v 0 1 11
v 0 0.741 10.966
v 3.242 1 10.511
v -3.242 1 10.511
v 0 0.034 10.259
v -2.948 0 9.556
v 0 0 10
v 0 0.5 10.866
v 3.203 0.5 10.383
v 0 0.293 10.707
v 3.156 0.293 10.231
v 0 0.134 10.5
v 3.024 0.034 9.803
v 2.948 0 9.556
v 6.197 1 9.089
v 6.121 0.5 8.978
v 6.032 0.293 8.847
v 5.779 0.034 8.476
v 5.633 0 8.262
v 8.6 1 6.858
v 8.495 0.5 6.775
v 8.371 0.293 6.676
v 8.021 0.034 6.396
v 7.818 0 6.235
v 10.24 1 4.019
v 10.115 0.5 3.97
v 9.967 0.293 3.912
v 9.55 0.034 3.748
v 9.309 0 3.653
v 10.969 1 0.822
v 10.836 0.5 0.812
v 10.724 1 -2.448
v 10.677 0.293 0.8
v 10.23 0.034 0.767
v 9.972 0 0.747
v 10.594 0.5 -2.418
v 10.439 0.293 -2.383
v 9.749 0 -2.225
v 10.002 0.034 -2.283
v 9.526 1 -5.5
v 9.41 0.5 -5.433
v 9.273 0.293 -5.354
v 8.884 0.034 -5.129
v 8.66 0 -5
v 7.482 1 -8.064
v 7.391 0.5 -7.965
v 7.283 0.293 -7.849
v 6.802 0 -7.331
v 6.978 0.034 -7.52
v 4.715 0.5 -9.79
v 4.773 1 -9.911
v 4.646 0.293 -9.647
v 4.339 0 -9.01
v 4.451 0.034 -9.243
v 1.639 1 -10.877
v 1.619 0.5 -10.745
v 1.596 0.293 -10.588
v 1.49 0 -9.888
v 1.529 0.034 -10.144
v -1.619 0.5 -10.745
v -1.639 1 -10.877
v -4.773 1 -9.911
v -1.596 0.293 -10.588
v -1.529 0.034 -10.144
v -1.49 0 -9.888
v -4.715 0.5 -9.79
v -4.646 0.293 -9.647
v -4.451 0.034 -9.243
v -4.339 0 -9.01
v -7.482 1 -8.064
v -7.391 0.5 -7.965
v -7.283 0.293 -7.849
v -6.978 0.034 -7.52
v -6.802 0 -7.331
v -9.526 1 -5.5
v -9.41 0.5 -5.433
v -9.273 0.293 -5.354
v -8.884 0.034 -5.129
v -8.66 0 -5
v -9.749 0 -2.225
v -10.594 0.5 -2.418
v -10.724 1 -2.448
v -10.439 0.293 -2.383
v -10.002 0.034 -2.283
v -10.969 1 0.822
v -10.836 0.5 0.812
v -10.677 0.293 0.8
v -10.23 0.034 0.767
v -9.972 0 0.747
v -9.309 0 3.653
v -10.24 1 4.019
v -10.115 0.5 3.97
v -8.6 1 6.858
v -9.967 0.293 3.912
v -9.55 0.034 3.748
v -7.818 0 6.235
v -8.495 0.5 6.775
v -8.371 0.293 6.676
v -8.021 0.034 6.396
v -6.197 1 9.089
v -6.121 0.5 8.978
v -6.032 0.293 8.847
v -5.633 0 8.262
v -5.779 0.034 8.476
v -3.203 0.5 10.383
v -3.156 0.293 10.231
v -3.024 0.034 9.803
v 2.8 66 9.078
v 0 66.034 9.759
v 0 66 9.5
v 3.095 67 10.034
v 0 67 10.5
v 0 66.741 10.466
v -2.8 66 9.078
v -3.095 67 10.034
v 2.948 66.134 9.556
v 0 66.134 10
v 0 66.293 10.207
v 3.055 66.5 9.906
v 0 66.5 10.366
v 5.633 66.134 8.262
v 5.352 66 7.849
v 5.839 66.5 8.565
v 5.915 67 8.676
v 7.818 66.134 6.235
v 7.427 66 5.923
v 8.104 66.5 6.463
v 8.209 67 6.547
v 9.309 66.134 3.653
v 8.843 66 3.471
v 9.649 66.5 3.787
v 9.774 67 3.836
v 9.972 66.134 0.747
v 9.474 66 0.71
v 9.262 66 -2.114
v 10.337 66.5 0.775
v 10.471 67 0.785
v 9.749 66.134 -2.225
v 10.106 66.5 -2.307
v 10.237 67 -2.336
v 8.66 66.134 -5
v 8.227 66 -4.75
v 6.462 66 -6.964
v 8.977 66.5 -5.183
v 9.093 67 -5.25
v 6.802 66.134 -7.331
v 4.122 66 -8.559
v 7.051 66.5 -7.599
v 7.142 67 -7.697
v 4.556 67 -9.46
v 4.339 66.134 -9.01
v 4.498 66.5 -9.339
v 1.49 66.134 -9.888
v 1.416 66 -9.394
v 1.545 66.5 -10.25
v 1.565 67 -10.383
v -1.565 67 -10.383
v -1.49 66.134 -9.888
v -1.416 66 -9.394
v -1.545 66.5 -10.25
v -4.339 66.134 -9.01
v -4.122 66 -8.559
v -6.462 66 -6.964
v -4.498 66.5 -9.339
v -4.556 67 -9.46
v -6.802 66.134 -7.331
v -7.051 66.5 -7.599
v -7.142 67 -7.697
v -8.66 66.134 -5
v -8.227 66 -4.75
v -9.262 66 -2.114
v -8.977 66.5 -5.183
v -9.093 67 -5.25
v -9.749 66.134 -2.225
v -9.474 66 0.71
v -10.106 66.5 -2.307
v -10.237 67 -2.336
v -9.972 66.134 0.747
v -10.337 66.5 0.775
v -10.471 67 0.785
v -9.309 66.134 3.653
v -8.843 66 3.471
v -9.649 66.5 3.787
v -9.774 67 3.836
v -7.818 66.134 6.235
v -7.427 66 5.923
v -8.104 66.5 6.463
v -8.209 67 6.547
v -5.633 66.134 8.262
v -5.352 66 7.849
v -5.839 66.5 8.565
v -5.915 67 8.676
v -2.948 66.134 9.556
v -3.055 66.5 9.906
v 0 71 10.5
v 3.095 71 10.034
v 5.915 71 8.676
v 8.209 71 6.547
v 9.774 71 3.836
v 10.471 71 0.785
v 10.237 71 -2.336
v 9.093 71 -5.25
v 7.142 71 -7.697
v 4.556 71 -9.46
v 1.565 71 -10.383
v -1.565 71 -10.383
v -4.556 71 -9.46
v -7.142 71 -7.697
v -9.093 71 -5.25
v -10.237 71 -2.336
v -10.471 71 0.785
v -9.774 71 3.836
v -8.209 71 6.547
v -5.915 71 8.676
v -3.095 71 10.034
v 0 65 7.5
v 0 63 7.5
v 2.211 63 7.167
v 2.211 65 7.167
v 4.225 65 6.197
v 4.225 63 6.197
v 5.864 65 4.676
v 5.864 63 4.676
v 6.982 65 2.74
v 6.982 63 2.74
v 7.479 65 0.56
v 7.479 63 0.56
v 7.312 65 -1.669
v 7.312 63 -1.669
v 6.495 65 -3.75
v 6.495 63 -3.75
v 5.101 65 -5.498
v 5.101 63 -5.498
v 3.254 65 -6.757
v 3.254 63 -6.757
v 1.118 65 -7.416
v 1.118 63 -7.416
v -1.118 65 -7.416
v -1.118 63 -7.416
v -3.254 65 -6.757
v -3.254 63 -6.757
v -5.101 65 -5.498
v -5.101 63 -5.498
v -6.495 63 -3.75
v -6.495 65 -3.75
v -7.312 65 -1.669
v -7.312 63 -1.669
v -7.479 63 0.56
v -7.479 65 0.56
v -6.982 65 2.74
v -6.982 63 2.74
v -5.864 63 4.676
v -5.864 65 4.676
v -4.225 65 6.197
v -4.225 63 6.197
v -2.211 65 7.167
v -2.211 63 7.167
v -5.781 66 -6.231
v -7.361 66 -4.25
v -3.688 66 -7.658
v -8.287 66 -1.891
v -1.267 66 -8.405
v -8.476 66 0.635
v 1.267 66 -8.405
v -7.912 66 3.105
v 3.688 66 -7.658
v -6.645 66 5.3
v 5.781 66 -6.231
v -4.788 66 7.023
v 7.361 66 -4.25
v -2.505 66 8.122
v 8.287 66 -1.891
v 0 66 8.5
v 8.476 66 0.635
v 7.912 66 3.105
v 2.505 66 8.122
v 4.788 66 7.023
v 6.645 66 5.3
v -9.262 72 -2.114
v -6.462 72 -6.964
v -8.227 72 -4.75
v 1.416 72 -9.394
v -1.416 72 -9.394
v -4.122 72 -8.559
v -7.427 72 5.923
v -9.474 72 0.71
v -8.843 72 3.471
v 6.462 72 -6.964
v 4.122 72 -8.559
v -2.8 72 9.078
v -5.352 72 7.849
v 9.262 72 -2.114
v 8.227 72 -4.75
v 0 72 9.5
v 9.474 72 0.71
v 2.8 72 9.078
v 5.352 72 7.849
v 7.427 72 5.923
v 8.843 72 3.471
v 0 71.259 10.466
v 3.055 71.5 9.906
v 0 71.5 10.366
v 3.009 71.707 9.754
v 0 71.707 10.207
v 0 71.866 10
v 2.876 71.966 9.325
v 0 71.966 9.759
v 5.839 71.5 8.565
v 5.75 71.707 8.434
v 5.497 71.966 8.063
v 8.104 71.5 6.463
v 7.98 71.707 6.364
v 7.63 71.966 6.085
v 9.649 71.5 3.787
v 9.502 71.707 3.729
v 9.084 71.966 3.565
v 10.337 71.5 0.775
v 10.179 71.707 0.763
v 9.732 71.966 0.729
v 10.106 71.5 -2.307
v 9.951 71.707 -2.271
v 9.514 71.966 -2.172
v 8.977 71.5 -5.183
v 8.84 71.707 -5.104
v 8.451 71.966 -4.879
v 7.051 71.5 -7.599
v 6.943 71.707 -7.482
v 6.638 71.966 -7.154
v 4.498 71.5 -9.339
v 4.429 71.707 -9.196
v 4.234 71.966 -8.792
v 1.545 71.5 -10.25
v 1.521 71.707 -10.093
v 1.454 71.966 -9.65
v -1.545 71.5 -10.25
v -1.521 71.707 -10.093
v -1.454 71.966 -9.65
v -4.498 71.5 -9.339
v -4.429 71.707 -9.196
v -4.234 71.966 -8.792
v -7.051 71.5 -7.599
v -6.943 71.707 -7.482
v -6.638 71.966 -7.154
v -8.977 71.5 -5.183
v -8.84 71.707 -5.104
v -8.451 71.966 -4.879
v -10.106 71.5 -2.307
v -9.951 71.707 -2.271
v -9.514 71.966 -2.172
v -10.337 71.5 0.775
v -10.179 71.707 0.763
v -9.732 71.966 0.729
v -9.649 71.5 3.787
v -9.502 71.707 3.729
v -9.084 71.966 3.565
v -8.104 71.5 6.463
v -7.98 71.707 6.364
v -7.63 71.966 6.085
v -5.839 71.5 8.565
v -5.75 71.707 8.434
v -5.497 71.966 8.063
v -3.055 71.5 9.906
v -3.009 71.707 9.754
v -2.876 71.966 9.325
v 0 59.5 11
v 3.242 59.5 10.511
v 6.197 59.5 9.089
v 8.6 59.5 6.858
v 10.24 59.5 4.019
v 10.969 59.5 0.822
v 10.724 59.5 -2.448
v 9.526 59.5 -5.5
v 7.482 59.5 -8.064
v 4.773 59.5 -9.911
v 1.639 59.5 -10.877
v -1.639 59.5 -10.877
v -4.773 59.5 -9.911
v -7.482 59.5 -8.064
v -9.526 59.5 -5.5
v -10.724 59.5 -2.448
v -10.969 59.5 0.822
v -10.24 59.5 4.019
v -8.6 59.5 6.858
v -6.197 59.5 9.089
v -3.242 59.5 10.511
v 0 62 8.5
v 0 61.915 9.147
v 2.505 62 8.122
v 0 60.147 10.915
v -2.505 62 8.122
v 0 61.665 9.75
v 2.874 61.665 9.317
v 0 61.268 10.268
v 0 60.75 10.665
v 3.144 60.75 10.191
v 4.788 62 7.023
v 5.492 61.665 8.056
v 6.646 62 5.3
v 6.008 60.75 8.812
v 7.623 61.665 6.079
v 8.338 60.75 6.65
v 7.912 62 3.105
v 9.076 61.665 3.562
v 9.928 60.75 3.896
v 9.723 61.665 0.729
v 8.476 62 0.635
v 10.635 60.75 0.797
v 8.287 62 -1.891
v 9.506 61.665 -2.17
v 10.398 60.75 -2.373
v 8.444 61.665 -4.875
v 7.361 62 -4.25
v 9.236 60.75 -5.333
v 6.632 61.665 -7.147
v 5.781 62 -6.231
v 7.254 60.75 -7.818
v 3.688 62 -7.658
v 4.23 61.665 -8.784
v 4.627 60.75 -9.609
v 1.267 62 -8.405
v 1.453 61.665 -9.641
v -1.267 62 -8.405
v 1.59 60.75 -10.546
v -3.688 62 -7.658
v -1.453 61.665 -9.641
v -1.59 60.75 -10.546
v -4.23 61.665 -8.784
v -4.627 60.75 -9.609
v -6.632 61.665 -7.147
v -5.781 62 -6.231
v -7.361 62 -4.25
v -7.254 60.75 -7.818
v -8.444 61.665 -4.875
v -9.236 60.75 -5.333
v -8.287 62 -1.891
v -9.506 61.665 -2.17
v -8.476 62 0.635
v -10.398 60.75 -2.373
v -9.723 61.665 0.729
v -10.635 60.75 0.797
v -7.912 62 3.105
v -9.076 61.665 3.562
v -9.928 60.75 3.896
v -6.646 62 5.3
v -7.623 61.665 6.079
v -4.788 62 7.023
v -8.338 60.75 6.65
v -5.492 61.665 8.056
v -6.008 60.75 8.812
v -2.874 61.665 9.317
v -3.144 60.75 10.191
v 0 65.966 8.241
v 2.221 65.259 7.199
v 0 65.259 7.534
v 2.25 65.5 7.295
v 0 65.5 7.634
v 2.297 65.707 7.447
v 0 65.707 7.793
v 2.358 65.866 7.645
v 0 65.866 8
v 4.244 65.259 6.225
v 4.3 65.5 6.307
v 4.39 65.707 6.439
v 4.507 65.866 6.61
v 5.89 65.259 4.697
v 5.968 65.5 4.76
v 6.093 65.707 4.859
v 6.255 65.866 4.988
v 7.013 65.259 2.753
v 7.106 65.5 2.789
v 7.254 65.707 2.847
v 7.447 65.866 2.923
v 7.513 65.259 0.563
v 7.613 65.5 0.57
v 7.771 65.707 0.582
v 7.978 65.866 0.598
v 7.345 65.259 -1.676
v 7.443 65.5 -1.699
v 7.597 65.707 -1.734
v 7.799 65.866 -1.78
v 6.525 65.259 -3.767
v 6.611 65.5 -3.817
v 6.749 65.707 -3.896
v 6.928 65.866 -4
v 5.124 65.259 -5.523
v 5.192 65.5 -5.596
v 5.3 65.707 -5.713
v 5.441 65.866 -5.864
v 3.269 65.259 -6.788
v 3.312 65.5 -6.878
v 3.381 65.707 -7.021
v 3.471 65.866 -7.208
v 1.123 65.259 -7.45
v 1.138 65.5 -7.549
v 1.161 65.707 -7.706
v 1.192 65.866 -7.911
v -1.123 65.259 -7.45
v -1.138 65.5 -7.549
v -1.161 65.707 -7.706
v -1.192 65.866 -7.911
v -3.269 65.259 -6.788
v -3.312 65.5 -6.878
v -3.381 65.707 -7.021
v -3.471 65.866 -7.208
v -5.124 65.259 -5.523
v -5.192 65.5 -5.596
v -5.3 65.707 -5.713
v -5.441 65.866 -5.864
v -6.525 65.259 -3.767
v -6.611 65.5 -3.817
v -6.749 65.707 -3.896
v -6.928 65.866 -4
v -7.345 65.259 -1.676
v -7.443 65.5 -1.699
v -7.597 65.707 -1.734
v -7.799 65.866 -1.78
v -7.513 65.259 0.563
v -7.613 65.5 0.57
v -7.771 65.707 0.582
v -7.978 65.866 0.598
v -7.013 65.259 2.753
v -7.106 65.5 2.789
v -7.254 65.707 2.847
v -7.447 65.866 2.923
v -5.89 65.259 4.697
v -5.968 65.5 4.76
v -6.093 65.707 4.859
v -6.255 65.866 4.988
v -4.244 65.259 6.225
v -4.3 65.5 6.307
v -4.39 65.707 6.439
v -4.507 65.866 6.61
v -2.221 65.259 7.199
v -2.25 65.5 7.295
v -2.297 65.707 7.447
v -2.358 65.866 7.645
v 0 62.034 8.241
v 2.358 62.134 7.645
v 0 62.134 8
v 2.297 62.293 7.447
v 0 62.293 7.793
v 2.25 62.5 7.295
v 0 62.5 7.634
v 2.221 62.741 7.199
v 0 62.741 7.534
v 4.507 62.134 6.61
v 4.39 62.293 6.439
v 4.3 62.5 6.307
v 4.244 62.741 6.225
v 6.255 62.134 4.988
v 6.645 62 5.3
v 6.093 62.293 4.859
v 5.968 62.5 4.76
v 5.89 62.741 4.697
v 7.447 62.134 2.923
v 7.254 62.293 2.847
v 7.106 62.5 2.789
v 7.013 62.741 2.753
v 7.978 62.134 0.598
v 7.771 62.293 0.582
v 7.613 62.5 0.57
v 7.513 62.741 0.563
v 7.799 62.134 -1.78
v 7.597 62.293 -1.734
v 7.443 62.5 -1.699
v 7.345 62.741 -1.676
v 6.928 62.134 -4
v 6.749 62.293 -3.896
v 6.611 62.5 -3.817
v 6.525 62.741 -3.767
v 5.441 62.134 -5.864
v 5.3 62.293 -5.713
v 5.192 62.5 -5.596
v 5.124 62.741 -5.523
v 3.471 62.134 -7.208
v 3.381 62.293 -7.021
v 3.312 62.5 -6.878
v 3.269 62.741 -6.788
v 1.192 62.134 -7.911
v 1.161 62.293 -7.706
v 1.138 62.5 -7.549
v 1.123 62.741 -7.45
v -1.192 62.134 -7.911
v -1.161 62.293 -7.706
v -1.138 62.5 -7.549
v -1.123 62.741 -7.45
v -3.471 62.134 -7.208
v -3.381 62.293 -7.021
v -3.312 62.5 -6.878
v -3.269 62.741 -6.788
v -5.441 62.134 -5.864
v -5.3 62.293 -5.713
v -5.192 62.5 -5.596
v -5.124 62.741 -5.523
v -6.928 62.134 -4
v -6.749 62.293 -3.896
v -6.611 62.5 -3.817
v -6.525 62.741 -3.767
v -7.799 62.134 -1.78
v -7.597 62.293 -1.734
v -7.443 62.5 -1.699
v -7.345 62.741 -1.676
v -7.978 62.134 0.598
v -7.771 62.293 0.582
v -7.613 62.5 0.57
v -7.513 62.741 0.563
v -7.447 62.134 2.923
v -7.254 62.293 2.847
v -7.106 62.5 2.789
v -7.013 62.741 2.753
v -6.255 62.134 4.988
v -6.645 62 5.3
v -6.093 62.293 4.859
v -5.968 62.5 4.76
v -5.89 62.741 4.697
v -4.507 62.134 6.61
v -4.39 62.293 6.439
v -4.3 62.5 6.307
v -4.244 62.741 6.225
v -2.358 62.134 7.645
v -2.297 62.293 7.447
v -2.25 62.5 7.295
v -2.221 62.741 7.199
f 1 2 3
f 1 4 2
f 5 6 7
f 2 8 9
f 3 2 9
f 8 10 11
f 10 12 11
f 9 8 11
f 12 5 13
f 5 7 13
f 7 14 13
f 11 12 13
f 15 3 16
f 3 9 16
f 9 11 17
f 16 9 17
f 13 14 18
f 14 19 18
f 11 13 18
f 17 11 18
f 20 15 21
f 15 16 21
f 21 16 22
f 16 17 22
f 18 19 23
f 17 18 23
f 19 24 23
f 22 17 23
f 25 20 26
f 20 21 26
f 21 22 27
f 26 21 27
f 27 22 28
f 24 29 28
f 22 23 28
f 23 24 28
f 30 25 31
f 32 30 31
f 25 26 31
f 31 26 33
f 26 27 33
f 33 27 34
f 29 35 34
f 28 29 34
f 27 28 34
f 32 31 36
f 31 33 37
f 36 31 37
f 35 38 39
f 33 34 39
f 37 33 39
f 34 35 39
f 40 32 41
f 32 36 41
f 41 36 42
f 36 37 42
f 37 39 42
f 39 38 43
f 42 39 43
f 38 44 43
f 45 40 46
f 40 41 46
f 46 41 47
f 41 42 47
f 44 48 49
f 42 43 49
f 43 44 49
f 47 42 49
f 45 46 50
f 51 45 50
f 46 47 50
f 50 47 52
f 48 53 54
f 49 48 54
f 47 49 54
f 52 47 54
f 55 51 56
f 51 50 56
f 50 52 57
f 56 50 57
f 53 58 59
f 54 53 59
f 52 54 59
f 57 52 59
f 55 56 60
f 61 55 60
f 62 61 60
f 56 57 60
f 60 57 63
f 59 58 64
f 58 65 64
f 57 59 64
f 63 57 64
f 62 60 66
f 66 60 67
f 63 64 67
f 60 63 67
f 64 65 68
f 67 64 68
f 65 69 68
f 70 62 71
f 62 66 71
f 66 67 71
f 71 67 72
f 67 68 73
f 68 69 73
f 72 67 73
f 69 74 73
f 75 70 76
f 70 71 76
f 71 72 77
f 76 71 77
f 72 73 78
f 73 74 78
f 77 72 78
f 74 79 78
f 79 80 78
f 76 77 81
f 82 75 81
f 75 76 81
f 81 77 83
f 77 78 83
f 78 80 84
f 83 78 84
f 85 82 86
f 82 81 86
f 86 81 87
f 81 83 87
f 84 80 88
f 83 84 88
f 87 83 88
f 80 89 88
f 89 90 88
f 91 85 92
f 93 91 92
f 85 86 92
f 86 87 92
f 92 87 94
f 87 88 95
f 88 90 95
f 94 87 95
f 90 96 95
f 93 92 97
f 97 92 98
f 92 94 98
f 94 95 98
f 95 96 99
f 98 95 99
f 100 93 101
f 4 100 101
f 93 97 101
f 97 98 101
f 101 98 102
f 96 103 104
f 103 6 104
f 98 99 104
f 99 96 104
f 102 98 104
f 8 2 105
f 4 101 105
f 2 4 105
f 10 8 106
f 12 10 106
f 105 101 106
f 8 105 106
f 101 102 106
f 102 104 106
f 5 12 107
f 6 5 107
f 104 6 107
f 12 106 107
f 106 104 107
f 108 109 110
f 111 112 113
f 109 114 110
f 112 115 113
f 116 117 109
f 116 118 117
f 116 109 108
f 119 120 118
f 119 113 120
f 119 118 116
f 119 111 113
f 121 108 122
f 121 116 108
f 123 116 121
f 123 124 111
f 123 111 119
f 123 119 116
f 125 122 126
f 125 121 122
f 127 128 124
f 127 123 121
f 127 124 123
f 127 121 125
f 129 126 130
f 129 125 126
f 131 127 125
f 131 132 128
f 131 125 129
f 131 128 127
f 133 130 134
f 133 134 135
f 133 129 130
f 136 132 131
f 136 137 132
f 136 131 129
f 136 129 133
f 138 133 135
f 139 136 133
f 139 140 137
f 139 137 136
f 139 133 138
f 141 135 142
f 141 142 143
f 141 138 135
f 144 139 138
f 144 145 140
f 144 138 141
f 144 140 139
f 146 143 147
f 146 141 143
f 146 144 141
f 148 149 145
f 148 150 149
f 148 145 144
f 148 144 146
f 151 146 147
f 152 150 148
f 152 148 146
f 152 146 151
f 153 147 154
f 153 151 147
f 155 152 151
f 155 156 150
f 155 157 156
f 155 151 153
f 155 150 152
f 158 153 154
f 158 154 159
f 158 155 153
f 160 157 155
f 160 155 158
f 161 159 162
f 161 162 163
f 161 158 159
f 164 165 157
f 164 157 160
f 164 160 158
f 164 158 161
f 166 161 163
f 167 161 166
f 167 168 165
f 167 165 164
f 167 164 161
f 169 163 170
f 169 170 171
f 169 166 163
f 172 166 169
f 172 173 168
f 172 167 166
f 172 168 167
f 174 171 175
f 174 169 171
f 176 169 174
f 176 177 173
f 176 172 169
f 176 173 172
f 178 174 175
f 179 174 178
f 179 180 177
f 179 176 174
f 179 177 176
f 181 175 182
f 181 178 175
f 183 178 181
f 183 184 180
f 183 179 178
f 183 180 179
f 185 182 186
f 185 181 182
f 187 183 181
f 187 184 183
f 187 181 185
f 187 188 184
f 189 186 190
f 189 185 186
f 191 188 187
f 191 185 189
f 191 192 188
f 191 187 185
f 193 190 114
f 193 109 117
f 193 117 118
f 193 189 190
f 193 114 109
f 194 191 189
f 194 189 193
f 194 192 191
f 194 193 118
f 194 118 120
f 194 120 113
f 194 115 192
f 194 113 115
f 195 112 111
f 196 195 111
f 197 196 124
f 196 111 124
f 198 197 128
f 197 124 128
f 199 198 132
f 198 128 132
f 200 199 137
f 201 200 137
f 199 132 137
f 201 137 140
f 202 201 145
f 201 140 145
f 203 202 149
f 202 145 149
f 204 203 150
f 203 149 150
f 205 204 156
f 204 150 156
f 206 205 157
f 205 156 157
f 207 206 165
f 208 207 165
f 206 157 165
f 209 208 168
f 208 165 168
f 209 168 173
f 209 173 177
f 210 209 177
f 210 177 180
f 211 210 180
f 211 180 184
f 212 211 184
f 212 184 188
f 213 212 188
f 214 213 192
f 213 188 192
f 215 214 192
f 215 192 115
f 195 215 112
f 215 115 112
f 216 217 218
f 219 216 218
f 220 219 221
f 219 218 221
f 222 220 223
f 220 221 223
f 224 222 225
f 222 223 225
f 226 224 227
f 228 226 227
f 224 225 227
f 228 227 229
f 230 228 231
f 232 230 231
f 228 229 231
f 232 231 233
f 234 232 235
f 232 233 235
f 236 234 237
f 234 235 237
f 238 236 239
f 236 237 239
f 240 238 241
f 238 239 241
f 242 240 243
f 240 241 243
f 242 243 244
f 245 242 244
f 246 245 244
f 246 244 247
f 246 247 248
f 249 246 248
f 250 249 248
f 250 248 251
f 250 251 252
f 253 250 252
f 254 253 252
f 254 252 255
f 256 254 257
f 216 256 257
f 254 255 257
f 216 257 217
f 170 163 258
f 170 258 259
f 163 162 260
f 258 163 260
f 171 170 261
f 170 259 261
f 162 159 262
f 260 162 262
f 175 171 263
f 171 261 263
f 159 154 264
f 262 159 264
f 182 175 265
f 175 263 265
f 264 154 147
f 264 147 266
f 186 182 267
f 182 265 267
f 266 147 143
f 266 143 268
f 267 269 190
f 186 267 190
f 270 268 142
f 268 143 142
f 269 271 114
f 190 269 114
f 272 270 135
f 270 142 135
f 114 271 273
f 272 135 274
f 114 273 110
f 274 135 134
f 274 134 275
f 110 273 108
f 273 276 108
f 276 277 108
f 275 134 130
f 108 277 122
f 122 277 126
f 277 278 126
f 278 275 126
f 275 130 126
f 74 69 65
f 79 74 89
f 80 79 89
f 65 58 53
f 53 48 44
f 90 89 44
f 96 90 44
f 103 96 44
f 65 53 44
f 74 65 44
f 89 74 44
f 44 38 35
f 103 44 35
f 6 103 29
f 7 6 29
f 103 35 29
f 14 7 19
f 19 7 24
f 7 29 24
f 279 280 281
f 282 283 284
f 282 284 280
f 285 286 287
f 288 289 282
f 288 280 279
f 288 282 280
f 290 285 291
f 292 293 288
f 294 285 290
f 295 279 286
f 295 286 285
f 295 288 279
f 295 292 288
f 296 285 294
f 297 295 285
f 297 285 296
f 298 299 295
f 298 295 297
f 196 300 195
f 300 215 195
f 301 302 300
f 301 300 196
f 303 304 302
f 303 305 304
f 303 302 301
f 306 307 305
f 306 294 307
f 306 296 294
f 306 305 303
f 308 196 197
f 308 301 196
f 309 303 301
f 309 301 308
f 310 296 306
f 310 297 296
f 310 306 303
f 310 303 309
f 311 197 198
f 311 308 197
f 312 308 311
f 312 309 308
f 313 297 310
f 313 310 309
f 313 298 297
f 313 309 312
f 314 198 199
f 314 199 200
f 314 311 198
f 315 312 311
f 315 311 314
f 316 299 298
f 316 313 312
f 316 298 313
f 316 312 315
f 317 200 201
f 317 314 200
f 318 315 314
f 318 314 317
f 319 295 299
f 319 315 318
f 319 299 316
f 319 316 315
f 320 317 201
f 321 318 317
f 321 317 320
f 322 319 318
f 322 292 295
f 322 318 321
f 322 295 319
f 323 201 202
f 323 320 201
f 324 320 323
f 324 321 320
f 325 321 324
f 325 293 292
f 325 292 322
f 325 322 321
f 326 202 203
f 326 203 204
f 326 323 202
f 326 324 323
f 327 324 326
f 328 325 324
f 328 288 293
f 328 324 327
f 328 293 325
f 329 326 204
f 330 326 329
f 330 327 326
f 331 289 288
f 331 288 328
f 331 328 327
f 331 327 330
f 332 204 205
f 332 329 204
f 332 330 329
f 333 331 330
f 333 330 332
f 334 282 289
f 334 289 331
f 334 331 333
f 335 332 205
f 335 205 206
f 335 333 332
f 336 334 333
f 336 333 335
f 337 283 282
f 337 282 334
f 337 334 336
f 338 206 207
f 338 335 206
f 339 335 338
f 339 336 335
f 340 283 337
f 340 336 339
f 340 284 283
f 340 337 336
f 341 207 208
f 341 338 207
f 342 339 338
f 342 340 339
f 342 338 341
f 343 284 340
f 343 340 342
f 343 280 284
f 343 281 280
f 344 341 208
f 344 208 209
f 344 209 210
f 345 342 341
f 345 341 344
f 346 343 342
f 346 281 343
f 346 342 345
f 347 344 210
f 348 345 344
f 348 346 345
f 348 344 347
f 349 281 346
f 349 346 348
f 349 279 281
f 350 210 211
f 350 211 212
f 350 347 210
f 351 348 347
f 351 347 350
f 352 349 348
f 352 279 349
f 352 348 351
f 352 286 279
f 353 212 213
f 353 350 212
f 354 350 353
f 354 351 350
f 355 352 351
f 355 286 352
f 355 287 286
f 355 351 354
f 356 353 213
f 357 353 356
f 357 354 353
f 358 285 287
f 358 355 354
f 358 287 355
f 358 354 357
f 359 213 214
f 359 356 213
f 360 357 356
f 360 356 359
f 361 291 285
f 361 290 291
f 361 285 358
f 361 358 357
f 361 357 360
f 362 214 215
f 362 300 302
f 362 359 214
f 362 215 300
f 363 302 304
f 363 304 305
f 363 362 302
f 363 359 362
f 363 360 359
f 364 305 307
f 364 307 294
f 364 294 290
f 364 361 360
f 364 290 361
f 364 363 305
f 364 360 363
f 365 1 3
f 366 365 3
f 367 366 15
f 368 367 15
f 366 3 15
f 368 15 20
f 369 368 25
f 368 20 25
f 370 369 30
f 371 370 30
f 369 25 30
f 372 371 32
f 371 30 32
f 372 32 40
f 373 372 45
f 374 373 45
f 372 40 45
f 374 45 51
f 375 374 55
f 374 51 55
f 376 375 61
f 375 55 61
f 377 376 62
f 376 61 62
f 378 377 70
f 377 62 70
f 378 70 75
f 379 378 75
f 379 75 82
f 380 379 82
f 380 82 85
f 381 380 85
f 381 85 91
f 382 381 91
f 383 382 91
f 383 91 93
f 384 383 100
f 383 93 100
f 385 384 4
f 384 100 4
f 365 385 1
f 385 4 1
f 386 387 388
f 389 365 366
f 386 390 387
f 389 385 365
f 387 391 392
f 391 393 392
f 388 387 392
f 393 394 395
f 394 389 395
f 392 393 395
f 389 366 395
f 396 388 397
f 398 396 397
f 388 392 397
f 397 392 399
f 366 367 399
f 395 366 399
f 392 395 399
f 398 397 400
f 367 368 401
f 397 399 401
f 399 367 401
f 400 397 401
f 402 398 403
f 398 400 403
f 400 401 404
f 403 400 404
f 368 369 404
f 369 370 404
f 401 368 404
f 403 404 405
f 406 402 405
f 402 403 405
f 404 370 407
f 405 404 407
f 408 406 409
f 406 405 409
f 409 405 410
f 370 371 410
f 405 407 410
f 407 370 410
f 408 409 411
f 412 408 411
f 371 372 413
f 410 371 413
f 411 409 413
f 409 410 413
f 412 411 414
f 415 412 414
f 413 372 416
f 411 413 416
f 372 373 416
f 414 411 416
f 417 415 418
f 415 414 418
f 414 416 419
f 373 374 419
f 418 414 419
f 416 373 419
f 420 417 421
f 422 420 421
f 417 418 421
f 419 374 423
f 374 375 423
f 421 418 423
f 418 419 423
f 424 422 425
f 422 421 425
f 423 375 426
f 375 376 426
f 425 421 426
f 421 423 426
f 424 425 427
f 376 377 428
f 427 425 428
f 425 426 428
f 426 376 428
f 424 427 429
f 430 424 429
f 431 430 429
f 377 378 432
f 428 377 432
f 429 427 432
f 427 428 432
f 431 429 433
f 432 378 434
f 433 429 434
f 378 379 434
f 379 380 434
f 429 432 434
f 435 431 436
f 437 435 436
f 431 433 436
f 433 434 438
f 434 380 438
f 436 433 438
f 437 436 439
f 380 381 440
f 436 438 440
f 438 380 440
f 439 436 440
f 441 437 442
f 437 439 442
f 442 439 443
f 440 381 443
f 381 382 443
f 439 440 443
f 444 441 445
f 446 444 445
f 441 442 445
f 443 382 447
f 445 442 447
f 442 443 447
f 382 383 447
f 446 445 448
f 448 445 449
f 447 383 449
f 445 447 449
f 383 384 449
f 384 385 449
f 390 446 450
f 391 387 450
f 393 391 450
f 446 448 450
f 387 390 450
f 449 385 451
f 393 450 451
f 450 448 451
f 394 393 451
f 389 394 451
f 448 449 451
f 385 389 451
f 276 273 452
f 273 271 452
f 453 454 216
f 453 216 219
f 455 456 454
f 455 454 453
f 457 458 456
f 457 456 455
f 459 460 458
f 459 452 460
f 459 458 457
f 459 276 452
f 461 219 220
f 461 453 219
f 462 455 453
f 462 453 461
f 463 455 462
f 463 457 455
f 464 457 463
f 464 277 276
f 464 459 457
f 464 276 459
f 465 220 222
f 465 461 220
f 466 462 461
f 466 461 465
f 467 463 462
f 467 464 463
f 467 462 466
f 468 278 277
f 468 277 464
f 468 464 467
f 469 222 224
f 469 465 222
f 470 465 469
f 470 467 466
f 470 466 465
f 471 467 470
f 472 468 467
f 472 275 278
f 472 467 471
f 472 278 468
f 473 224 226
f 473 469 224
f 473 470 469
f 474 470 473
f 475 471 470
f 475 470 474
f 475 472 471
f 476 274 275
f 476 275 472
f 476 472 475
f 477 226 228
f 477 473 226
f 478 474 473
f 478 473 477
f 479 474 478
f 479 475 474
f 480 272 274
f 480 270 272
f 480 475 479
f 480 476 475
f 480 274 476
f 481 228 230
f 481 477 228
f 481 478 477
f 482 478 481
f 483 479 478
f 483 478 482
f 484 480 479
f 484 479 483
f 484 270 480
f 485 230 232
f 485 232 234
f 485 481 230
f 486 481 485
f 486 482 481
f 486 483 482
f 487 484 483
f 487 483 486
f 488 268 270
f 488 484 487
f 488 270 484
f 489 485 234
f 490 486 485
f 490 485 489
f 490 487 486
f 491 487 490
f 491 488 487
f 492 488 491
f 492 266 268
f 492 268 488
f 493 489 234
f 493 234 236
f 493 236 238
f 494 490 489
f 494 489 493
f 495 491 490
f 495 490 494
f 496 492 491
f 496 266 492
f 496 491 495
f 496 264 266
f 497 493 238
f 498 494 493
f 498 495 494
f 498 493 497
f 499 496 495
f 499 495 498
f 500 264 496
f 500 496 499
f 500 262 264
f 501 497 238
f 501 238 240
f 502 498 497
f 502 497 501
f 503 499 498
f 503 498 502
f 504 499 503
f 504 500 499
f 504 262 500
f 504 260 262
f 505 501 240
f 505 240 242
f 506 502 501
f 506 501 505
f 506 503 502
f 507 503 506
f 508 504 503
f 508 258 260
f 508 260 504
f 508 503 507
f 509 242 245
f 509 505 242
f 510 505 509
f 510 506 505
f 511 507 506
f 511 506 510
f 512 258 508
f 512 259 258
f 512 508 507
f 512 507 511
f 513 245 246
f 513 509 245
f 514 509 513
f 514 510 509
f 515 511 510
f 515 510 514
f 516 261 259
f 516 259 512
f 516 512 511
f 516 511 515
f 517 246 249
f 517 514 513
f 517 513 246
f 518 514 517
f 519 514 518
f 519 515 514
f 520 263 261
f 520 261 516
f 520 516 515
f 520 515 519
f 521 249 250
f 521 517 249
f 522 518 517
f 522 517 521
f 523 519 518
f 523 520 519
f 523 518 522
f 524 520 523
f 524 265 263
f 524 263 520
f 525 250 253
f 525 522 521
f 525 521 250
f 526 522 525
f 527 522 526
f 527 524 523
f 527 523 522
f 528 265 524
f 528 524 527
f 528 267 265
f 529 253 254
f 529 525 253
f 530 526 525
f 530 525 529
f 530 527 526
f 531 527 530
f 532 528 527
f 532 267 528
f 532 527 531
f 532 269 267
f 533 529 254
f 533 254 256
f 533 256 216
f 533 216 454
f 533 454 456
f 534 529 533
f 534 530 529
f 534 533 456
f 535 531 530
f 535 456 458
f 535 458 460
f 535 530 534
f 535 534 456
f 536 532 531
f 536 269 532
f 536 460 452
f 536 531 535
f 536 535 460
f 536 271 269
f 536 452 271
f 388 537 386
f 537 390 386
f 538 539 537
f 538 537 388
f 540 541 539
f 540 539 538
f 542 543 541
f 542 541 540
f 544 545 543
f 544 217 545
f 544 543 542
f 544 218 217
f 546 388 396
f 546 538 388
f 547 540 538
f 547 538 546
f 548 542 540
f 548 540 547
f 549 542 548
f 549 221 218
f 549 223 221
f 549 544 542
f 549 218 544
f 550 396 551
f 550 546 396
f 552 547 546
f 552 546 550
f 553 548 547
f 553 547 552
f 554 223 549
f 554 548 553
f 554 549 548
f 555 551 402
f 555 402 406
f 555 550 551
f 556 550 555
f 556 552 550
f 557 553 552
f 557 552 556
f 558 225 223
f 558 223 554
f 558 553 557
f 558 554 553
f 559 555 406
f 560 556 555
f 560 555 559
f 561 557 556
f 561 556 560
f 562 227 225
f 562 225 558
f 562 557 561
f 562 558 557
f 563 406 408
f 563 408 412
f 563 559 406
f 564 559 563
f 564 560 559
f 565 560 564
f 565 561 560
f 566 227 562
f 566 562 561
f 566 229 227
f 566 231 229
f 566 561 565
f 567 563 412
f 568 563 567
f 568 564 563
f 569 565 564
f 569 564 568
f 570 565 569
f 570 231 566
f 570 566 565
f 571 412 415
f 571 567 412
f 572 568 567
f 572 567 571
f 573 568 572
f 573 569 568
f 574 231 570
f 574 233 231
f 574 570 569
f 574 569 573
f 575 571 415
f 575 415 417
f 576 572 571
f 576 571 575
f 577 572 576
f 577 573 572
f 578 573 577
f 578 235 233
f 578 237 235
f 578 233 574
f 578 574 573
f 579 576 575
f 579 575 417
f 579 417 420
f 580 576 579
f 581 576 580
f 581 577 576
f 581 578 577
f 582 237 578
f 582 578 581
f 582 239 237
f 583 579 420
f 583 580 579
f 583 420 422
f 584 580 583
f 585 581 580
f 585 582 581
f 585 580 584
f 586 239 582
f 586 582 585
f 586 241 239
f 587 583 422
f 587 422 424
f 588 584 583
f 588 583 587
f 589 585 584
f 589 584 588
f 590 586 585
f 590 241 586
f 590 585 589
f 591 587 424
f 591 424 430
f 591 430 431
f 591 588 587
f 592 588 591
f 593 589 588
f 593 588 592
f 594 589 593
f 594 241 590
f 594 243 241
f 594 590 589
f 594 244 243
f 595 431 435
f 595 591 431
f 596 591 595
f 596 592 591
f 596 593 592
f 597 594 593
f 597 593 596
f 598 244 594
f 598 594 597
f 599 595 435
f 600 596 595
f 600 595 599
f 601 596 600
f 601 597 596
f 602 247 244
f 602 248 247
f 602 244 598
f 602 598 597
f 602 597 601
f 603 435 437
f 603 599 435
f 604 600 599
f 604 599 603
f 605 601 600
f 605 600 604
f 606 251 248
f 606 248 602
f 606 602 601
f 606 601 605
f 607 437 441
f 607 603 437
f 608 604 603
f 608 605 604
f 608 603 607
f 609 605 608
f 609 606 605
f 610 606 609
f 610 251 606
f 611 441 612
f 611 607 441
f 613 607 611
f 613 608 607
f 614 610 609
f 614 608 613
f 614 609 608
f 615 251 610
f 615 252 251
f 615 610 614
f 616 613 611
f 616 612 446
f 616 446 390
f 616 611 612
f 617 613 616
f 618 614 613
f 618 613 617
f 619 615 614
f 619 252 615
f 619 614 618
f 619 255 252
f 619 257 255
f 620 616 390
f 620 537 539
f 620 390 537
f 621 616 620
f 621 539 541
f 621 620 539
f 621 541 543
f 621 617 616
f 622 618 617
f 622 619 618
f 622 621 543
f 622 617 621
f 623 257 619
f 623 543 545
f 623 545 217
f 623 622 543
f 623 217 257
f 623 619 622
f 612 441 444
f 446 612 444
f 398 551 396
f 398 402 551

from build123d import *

# Parameters (mm, degrees)
CROQUIS1_R              = 11
SALIENTE_EXTRUIR1_DEPTH = 62
CROQUIS2_R              = 7.5
SALIENTE_EXTRUIR2_DEPTH = 4
CROQUIS3_R              = 10.5
SALIENTE_EXTRUIR3_DEPTH = 6
REDONDEO1_R             = 2.5
REDONDEO2_R             = 1
REDONDEO3_R             = 1


with BuildPart() as part:
    # Croquis1 → Saliente-Extruir1 (new body)
    with BuildSketch(Plane(origin=(0, 0, 0), x_dir=(1, 0, 0), z_dir=(0, 1, 0))):
        with Locations(Location((0, 0, 0), (0, 0, 270))):
            Circle(CROQUIS1_R)
    extrude(amount=SALIENTE_EXTRUIR1_DEPTH)

    # Croquis2 → Saliente-Extruir2 (add)
    with BuildSketch(Plane(origin=(0, 62, 0), x_dir=(1, 0, 0), z_dir=(0, 1, 0))):
        with Locations(Location((0, 0, 0), (0, 0, 270))):
            Circle(CROQUIS2_R)
    extrude(amount=SALIENTE_EXTRUIR2_DEPTH)

    # Croquis3 → Saliente-Extruir3 (add)
    with BuildSketch(Plane(origin=(0, 66, 0), x_dir=(1, 0, 0), z_dir=(0, 1, 0))):
        with Locations(Location((0, 0, 0), (0, 0, 270))):
            Circle(CROQUIS3_R)
    extrude(amount=SALIENTE_EXTRUIR3_DEPTH)

    # Redondeo1
    redondeo1_edges = [part.edges().sort_by_distance(p)[0] for p in [
        (0, 62, -11),
    ]]
    fillet(redondeo1_edges, radius=REDONDEO1_R)

    # Redondeo2
    redondeo2_edges = [part.edges().sort_by_distance(p)[0] for p in [
        (0, 72, -10.5),
        (0, 62, -7.5),
        (0, 66, -7.5),
        (0, 66, -10.5),
    ]]
    fillet(redondeo2_edges, radius=REDONDEO2_R - 0.0001)  # a hair under: the kernel refuses the full size

    # Redondeo3
    redondeo3_edges = [part.edges().sort_by_distance(p)[0] for p in [
        (0, 0, -11),
    ]]
    fillet(redondeo3_edges, radius=REDONDEO3_R)


solid = part.part
